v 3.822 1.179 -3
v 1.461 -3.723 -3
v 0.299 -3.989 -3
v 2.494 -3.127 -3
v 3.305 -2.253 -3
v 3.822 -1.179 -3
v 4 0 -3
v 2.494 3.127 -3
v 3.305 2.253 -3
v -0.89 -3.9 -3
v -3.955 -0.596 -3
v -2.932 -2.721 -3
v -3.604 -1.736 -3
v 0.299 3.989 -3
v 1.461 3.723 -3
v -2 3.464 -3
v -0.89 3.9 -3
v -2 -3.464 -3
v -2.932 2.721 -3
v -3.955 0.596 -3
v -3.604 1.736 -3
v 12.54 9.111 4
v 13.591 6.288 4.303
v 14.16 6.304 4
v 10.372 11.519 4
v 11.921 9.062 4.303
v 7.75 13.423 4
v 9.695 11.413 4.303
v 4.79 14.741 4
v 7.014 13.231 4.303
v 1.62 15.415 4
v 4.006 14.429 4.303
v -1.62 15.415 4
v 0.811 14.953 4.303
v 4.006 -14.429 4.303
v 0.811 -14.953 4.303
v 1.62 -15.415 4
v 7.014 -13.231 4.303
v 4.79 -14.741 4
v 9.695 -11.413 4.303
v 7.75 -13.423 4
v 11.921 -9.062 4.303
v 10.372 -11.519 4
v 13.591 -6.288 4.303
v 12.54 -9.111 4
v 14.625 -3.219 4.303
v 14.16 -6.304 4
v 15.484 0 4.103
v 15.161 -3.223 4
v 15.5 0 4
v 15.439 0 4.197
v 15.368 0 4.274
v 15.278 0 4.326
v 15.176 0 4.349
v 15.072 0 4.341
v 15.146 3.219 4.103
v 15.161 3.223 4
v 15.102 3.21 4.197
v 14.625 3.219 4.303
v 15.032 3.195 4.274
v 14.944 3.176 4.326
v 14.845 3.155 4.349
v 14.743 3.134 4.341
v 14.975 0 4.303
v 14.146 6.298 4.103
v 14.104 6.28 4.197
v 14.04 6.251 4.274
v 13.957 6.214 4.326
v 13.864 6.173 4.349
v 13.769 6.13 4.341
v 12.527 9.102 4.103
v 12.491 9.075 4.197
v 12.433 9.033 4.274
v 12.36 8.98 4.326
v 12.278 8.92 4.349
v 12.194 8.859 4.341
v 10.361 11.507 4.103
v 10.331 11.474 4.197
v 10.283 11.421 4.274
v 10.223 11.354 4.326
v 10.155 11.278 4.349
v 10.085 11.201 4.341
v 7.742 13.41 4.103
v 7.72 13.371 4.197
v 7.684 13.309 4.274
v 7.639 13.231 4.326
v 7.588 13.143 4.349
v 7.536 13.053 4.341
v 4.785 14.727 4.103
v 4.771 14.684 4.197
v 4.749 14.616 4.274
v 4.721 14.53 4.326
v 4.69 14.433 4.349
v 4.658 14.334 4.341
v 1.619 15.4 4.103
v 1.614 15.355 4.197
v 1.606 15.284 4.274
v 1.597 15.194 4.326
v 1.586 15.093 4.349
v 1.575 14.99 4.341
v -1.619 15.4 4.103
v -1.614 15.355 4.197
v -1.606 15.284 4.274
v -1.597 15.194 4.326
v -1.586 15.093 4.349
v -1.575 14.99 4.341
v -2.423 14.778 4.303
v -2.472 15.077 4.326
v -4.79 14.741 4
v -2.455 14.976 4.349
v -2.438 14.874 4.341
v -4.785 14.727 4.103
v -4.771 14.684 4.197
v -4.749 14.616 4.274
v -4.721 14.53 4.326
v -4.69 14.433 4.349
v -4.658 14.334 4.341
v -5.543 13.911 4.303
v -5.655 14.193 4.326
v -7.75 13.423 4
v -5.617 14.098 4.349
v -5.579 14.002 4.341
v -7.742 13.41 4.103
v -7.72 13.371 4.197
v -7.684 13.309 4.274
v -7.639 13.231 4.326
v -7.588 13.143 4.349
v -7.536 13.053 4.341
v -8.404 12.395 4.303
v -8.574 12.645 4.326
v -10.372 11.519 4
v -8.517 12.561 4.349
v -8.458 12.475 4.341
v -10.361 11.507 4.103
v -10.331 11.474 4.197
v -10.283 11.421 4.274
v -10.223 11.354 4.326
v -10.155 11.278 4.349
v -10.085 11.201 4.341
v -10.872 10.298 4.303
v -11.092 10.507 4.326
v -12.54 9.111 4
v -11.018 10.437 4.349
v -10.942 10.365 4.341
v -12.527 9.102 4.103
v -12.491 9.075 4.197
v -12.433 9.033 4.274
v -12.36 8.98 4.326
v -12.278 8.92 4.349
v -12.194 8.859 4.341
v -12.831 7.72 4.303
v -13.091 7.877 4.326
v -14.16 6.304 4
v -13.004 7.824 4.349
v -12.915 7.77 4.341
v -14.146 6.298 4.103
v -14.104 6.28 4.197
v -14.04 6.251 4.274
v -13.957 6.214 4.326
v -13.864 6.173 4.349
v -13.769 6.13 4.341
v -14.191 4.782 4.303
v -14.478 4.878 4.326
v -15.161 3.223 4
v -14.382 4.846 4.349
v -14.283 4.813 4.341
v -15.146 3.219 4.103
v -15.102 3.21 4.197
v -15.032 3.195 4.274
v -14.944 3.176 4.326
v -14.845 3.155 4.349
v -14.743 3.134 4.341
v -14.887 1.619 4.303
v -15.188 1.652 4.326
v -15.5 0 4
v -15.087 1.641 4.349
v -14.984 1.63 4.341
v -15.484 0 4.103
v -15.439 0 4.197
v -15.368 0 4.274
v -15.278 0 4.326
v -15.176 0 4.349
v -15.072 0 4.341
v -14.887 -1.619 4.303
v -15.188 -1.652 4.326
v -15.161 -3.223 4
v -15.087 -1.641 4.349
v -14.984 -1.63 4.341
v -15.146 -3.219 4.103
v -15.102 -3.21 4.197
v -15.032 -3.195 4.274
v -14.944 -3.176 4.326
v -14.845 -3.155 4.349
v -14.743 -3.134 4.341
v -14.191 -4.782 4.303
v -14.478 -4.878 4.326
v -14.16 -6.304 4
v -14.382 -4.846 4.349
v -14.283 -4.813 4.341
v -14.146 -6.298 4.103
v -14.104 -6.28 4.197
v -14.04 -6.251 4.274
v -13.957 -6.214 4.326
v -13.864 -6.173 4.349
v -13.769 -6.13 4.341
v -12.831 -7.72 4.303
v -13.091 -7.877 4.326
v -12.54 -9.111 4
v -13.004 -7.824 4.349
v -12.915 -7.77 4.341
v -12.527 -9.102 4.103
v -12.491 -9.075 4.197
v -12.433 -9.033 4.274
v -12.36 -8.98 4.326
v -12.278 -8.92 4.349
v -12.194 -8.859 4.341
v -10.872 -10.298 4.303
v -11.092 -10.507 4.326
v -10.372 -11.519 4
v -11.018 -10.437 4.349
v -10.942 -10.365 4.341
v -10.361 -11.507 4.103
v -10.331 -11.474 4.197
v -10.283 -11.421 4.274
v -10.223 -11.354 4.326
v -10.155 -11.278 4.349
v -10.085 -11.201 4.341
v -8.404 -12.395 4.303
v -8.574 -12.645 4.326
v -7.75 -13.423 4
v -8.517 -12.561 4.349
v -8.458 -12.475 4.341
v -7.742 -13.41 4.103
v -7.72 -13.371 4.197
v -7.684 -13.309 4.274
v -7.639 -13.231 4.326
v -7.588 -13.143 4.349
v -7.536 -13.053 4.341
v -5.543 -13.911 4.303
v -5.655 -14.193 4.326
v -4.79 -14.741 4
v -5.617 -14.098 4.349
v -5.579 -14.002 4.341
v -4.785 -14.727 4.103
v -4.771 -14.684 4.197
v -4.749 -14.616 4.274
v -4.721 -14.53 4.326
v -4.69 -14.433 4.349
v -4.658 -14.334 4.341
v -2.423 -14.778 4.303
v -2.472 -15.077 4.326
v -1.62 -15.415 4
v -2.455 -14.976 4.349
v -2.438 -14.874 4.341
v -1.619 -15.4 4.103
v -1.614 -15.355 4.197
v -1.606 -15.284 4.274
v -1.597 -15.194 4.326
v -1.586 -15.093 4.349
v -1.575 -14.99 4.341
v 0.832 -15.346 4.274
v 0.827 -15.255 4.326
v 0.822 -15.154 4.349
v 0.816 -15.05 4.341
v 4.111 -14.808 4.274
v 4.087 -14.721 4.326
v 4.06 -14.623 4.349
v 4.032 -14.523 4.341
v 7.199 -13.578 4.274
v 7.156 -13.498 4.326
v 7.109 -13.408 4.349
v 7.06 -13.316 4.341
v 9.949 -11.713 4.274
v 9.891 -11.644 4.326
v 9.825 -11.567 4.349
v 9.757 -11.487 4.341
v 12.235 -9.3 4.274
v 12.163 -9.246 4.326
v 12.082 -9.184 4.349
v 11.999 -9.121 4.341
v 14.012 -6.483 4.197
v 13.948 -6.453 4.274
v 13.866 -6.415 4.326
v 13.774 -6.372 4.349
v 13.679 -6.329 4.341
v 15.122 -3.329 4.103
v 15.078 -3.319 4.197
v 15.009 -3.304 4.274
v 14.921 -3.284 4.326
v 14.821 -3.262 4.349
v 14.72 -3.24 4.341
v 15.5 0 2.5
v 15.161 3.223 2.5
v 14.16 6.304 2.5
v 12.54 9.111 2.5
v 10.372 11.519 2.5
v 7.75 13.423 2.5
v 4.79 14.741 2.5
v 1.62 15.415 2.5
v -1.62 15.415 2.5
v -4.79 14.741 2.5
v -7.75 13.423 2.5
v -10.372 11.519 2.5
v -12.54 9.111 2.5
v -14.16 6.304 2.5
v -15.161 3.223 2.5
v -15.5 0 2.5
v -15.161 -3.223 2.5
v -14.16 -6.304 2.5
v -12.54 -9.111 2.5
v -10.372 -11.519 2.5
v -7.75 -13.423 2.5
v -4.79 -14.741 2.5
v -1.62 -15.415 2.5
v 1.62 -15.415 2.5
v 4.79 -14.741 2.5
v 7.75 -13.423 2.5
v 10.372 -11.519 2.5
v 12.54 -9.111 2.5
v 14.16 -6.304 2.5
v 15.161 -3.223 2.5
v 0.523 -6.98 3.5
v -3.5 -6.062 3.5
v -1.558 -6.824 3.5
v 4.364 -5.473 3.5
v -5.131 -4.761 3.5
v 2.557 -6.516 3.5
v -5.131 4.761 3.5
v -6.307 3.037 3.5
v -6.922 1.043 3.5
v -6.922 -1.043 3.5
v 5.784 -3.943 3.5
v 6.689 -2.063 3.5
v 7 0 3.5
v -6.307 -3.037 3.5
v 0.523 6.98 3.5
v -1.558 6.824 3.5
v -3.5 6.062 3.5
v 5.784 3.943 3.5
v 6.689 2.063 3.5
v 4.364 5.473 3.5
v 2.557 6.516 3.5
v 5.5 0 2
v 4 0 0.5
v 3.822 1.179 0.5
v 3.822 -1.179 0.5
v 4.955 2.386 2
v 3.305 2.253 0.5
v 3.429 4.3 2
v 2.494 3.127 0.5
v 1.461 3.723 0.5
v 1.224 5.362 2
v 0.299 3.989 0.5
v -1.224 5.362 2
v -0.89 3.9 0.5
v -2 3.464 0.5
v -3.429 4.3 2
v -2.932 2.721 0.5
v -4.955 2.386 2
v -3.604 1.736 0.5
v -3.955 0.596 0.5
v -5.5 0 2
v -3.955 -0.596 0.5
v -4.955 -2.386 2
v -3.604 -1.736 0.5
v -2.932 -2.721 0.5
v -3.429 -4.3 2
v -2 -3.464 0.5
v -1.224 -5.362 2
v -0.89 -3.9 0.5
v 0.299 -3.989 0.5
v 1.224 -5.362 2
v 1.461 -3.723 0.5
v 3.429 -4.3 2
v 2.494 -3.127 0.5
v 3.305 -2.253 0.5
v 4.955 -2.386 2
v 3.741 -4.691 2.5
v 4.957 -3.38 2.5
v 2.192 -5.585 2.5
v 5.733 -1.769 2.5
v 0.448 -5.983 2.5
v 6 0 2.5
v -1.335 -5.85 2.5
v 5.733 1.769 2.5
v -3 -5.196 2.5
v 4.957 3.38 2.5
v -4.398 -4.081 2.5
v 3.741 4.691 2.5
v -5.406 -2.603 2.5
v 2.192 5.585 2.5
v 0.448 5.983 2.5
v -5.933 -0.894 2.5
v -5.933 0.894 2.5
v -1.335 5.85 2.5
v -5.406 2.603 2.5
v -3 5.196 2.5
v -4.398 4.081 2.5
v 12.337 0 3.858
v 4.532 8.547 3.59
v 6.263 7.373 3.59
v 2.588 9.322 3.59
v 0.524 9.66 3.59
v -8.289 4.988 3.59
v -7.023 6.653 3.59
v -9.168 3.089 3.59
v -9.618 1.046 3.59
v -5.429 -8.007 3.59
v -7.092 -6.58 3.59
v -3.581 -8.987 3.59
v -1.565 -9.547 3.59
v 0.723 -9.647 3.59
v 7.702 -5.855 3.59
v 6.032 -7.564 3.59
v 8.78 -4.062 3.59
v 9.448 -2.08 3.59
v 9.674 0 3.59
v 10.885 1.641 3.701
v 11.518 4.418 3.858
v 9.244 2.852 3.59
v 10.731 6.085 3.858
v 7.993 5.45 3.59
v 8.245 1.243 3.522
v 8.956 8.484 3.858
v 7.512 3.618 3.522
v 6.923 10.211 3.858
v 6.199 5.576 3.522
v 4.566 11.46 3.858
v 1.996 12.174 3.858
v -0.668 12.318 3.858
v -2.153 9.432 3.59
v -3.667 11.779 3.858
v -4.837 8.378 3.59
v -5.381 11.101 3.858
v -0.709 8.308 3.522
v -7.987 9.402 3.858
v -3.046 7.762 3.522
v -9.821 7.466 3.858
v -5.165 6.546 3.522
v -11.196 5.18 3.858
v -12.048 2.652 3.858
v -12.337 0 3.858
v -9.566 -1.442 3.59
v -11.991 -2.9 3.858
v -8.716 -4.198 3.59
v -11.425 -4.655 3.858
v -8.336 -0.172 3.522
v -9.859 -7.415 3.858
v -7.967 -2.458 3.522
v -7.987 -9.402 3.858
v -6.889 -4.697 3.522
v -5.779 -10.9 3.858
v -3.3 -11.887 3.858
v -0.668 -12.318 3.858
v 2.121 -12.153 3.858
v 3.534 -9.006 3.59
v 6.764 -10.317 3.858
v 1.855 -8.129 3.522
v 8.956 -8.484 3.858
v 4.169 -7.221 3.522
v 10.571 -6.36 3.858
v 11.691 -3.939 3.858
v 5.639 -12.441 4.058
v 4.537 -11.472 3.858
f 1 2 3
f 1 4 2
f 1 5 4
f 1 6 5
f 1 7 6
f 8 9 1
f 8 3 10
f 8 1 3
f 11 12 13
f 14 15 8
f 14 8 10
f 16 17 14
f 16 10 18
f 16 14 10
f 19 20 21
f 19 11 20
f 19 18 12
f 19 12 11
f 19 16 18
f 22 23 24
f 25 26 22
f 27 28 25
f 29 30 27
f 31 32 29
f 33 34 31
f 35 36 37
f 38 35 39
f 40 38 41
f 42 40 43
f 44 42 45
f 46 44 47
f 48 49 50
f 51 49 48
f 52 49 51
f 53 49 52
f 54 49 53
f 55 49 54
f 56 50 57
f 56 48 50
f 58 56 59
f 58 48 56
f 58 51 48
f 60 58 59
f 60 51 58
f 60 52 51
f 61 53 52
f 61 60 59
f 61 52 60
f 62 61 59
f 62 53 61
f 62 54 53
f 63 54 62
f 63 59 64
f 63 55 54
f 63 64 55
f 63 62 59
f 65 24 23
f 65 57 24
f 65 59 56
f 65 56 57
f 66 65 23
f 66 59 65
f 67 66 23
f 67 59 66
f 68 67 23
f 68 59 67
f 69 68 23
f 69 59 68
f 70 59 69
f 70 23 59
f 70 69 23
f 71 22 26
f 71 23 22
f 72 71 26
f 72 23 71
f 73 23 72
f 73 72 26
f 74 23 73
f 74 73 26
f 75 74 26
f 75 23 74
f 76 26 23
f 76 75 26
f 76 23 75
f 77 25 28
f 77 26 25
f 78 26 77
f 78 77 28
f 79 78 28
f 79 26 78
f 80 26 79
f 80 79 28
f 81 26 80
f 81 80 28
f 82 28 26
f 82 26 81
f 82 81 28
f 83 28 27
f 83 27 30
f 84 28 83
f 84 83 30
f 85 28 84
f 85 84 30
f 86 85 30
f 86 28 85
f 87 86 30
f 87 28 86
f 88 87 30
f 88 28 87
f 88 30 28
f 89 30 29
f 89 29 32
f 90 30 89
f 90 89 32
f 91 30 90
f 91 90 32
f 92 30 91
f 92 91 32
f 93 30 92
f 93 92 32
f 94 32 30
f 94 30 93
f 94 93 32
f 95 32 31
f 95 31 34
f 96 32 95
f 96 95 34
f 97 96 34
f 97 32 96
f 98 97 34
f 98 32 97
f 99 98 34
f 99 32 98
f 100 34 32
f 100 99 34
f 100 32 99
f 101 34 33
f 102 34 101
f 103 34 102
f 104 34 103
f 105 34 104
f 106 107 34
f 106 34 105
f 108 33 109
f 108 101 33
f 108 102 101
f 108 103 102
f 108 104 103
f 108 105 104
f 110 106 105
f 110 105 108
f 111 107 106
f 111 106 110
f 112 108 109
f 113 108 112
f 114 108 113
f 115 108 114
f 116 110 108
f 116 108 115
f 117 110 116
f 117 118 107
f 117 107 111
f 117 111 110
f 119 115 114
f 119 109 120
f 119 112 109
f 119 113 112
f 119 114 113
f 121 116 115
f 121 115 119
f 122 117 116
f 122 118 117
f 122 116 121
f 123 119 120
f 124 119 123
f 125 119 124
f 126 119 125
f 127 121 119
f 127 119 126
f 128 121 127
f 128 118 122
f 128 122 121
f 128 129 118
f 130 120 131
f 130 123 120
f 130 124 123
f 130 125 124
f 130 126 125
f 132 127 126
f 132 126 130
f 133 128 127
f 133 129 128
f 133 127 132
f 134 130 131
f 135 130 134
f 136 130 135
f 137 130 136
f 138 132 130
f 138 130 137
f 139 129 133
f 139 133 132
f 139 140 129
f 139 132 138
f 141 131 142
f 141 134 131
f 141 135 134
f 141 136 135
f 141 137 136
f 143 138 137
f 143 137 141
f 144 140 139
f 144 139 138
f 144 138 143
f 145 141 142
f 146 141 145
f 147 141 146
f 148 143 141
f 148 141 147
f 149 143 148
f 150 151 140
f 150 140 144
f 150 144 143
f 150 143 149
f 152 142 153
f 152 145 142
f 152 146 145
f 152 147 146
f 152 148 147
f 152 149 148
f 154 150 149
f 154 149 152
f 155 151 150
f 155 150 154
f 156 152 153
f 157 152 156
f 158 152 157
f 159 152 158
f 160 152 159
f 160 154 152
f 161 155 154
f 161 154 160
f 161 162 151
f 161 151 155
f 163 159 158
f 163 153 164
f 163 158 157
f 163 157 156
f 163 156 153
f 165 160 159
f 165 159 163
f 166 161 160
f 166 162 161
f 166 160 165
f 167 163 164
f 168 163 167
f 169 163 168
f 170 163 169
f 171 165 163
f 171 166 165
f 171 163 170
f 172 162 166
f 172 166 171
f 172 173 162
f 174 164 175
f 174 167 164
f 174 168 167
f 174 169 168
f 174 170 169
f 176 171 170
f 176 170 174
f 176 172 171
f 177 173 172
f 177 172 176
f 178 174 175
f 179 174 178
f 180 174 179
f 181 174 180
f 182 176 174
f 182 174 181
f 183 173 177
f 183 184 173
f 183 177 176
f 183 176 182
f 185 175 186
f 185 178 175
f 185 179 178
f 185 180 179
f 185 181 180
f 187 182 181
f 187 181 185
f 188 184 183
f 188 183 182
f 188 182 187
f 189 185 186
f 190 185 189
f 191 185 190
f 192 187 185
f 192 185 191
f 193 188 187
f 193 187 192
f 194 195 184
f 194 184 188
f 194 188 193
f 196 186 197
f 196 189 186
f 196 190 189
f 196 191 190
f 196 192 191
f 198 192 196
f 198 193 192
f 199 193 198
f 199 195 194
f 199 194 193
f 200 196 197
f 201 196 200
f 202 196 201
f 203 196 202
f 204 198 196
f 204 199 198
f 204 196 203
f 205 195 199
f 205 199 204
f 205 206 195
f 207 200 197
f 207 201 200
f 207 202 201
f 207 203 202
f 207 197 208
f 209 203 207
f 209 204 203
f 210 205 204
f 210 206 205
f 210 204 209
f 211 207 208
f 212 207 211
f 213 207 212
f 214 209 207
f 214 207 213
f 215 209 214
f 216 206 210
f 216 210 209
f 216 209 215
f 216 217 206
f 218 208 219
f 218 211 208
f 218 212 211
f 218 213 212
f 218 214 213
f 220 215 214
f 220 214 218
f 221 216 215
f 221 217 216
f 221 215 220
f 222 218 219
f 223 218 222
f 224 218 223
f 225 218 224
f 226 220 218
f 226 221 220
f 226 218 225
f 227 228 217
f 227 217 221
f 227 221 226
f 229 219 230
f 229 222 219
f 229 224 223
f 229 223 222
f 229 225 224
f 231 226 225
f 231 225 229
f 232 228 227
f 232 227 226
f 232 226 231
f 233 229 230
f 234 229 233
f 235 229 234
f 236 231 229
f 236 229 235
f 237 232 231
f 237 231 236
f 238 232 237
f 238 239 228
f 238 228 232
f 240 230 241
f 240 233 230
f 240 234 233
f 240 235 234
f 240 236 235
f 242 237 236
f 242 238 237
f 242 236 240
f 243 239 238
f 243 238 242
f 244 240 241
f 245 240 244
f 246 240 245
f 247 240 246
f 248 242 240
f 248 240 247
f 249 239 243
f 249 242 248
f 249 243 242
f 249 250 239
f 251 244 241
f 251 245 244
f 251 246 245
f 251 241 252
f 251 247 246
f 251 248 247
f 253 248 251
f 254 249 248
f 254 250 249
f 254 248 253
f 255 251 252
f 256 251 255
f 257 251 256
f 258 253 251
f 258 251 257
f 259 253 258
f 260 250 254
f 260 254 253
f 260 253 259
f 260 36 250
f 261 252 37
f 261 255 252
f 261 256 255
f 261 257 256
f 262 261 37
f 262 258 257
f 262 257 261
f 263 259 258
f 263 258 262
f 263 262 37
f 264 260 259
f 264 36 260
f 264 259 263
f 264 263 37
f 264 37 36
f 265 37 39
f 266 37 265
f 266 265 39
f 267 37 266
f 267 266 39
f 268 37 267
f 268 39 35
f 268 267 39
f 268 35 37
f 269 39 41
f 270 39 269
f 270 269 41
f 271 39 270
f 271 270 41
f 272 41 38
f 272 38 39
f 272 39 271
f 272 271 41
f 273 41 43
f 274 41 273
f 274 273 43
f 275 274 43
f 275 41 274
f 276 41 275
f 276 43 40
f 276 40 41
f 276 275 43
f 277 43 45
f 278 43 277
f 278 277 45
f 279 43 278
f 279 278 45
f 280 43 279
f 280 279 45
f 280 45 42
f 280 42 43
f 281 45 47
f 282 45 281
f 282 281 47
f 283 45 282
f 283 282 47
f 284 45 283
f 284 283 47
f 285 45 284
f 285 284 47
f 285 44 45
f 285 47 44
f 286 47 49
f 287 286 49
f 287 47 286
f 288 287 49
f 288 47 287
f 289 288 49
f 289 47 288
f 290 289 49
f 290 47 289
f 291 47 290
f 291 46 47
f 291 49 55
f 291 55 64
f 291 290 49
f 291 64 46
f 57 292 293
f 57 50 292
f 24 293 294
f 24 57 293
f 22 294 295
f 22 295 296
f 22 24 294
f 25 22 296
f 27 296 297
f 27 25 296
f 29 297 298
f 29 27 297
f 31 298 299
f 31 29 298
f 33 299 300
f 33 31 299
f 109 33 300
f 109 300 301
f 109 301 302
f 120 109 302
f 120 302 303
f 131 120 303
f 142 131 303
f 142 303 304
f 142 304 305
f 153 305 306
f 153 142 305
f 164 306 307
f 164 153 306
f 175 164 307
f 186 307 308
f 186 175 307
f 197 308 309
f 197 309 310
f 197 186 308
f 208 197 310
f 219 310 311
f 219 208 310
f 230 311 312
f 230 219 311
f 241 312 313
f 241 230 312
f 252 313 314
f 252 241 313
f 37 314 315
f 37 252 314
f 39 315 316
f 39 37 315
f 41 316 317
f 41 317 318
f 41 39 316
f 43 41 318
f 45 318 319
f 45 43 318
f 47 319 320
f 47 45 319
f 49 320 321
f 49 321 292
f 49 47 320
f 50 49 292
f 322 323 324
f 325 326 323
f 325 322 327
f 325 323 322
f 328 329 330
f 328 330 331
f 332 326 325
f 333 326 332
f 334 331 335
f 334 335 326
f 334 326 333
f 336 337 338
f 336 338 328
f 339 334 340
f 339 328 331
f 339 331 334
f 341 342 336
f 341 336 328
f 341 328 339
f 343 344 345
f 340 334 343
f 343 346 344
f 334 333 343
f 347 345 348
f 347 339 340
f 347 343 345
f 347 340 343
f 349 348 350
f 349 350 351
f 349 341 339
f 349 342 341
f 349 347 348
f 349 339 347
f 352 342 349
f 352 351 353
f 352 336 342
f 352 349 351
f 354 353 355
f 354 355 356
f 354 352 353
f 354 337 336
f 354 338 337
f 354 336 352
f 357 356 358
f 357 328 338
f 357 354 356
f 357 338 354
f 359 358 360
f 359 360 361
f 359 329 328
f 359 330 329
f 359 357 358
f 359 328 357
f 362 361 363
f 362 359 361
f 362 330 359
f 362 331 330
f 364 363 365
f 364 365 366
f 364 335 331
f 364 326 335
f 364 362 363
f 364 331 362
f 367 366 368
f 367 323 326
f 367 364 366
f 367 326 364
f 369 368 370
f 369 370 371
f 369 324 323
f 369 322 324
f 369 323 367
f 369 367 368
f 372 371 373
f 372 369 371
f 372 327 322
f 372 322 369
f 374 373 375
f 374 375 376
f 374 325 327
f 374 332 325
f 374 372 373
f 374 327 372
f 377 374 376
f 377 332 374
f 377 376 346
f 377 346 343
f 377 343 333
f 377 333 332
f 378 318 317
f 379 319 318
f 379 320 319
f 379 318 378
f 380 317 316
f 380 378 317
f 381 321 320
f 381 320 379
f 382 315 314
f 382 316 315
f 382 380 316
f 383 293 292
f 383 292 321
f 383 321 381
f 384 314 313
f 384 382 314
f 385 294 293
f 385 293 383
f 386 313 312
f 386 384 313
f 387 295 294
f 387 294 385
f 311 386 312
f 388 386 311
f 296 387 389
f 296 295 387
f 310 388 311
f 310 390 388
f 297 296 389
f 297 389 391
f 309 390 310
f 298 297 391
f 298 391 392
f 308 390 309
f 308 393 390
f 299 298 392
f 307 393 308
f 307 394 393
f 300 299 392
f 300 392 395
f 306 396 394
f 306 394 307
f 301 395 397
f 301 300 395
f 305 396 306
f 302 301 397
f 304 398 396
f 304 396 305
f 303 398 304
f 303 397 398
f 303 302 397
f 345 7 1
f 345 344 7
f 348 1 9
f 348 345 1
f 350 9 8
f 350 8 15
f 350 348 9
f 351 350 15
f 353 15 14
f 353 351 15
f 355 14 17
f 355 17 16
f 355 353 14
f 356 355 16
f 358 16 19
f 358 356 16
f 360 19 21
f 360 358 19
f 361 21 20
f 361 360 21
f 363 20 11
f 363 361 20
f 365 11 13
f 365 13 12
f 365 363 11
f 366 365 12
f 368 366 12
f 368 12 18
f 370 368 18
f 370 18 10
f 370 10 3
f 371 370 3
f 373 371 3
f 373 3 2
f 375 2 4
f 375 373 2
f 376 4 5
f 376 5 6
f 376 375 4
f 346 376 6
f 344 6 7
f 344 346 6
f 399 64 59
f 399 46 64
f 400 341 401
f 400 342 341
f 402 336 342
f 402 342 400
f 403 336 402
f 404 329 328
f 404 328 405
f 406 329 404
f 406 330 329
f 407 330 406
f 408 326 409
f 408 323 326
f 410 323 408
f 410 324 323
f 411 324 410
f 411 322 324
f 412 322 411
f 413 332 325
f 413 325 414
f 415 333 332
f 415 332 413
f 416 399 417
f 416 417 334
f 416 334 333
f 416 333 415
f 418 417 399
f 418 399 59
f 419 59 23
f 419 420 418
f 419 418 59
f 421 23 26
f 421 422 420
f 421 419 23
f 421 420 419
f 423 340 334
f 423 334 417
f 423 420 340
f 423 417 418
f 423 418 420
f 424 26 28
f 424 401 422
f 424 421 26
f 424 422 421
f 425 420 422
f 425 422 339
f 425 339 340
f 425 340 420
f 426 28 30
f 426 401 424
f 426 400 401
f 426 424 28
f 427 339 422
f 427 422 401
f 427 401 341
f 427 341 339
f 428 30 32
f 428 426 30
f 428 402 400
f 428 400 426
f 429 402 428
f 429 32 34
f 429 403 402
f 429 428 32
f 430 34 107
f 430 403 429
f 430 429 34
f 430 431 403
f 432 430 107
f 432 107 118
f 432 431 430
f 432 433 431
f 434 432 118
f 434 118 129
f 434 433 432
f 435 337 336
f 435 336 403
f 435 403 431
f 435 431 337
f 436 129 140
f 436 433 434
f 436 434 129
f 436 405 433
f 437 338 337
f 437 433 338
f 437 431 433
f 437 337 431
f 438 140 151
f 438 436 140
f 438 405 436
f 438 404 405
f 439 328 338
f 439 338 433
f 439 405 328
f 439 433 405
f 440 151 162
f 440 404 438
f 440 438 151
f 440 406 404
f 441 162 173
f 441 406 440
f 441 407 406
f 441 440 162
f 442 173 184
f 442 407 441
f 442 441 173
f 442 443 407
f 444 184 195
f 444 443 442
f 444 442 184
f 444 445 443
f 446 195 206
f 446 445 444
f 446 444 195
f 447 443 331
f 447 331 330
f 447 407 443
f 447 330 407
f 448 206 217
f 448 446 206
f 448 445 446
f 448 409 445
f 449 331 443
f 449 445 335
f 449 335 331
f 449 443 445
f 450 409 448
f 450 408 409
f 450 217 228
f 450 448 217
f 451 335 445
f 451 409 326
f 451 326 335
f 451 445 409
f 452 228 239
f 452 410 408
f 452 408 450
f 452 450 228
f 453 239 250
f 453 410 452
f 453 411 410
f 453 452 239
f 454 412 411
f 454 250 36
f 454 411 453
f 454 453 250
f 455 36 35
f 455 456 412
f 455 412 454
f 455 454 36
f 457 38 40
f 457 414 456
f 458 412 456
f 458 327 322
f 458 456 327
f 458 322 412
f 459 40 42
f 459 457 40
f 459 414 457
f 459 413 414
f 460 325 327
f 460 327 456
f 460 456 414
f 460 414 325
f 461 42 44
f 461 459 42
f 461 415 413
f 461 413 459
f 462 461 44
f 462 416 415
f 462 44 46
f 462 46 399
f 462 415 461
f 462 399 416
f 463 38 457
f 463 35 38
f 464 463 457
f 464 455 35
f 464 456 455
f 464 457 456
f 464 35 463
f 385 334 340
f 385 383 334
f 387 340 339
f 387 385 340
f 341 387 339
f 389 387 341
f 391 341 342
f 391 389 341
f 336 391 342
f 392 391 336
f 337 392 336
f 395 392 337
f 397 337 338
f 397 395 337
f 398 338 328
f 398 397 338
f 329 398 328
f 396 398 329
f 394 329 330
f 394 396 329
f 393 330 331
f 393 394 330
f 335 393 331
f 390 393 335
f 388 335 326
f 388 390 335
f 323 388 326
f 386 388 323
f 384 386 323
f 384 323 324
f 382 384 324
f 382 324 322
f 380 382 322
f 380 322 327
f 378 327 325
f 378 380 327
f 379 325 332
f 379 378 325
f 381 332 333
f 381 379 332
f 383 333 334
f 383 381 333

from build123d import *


with BuildPart() as f1:
    # F0 (on Front) → F1 (revolve)
    with BuildSketch(Plane.XZ):
        with BuildLine():
            Line((7, 3.5), (6, 2.5))
            Line((6, 2.5), (15.5, 2.5))
            Line((15.5, 2.5), (15.5, 4))
            ThreePointArc((15.5, 4), (15.325, 4.303109), (14.975, 4.303109))
            ThreePointArc((14.975, 4.303109), (11.007668, 3.701284), (7, 3.5))
        make_face()
    revolve(axis=Axis((0, 0, 1.25), (0, 0, 1)))


with BuildPart() as f2:
    # F0 (on Front) → F2 (revolve)
    with BuildSketch(Plane.XZ):
        Polygon((0, 3.5), (0, 2.5), (4, 2.5), (6, 2.5), (7, 3.5), align=None)
        Polygon((0, 2.5), (0, 0), (0, -3), (4, -3), (4, 0.5), (6, 2.5), (4, 2.5), align=None)
    revolve(axis=Axis((0, 0, 1.25), (0, 0, 1)))


solid = Compound([f1.part, f2.part])
